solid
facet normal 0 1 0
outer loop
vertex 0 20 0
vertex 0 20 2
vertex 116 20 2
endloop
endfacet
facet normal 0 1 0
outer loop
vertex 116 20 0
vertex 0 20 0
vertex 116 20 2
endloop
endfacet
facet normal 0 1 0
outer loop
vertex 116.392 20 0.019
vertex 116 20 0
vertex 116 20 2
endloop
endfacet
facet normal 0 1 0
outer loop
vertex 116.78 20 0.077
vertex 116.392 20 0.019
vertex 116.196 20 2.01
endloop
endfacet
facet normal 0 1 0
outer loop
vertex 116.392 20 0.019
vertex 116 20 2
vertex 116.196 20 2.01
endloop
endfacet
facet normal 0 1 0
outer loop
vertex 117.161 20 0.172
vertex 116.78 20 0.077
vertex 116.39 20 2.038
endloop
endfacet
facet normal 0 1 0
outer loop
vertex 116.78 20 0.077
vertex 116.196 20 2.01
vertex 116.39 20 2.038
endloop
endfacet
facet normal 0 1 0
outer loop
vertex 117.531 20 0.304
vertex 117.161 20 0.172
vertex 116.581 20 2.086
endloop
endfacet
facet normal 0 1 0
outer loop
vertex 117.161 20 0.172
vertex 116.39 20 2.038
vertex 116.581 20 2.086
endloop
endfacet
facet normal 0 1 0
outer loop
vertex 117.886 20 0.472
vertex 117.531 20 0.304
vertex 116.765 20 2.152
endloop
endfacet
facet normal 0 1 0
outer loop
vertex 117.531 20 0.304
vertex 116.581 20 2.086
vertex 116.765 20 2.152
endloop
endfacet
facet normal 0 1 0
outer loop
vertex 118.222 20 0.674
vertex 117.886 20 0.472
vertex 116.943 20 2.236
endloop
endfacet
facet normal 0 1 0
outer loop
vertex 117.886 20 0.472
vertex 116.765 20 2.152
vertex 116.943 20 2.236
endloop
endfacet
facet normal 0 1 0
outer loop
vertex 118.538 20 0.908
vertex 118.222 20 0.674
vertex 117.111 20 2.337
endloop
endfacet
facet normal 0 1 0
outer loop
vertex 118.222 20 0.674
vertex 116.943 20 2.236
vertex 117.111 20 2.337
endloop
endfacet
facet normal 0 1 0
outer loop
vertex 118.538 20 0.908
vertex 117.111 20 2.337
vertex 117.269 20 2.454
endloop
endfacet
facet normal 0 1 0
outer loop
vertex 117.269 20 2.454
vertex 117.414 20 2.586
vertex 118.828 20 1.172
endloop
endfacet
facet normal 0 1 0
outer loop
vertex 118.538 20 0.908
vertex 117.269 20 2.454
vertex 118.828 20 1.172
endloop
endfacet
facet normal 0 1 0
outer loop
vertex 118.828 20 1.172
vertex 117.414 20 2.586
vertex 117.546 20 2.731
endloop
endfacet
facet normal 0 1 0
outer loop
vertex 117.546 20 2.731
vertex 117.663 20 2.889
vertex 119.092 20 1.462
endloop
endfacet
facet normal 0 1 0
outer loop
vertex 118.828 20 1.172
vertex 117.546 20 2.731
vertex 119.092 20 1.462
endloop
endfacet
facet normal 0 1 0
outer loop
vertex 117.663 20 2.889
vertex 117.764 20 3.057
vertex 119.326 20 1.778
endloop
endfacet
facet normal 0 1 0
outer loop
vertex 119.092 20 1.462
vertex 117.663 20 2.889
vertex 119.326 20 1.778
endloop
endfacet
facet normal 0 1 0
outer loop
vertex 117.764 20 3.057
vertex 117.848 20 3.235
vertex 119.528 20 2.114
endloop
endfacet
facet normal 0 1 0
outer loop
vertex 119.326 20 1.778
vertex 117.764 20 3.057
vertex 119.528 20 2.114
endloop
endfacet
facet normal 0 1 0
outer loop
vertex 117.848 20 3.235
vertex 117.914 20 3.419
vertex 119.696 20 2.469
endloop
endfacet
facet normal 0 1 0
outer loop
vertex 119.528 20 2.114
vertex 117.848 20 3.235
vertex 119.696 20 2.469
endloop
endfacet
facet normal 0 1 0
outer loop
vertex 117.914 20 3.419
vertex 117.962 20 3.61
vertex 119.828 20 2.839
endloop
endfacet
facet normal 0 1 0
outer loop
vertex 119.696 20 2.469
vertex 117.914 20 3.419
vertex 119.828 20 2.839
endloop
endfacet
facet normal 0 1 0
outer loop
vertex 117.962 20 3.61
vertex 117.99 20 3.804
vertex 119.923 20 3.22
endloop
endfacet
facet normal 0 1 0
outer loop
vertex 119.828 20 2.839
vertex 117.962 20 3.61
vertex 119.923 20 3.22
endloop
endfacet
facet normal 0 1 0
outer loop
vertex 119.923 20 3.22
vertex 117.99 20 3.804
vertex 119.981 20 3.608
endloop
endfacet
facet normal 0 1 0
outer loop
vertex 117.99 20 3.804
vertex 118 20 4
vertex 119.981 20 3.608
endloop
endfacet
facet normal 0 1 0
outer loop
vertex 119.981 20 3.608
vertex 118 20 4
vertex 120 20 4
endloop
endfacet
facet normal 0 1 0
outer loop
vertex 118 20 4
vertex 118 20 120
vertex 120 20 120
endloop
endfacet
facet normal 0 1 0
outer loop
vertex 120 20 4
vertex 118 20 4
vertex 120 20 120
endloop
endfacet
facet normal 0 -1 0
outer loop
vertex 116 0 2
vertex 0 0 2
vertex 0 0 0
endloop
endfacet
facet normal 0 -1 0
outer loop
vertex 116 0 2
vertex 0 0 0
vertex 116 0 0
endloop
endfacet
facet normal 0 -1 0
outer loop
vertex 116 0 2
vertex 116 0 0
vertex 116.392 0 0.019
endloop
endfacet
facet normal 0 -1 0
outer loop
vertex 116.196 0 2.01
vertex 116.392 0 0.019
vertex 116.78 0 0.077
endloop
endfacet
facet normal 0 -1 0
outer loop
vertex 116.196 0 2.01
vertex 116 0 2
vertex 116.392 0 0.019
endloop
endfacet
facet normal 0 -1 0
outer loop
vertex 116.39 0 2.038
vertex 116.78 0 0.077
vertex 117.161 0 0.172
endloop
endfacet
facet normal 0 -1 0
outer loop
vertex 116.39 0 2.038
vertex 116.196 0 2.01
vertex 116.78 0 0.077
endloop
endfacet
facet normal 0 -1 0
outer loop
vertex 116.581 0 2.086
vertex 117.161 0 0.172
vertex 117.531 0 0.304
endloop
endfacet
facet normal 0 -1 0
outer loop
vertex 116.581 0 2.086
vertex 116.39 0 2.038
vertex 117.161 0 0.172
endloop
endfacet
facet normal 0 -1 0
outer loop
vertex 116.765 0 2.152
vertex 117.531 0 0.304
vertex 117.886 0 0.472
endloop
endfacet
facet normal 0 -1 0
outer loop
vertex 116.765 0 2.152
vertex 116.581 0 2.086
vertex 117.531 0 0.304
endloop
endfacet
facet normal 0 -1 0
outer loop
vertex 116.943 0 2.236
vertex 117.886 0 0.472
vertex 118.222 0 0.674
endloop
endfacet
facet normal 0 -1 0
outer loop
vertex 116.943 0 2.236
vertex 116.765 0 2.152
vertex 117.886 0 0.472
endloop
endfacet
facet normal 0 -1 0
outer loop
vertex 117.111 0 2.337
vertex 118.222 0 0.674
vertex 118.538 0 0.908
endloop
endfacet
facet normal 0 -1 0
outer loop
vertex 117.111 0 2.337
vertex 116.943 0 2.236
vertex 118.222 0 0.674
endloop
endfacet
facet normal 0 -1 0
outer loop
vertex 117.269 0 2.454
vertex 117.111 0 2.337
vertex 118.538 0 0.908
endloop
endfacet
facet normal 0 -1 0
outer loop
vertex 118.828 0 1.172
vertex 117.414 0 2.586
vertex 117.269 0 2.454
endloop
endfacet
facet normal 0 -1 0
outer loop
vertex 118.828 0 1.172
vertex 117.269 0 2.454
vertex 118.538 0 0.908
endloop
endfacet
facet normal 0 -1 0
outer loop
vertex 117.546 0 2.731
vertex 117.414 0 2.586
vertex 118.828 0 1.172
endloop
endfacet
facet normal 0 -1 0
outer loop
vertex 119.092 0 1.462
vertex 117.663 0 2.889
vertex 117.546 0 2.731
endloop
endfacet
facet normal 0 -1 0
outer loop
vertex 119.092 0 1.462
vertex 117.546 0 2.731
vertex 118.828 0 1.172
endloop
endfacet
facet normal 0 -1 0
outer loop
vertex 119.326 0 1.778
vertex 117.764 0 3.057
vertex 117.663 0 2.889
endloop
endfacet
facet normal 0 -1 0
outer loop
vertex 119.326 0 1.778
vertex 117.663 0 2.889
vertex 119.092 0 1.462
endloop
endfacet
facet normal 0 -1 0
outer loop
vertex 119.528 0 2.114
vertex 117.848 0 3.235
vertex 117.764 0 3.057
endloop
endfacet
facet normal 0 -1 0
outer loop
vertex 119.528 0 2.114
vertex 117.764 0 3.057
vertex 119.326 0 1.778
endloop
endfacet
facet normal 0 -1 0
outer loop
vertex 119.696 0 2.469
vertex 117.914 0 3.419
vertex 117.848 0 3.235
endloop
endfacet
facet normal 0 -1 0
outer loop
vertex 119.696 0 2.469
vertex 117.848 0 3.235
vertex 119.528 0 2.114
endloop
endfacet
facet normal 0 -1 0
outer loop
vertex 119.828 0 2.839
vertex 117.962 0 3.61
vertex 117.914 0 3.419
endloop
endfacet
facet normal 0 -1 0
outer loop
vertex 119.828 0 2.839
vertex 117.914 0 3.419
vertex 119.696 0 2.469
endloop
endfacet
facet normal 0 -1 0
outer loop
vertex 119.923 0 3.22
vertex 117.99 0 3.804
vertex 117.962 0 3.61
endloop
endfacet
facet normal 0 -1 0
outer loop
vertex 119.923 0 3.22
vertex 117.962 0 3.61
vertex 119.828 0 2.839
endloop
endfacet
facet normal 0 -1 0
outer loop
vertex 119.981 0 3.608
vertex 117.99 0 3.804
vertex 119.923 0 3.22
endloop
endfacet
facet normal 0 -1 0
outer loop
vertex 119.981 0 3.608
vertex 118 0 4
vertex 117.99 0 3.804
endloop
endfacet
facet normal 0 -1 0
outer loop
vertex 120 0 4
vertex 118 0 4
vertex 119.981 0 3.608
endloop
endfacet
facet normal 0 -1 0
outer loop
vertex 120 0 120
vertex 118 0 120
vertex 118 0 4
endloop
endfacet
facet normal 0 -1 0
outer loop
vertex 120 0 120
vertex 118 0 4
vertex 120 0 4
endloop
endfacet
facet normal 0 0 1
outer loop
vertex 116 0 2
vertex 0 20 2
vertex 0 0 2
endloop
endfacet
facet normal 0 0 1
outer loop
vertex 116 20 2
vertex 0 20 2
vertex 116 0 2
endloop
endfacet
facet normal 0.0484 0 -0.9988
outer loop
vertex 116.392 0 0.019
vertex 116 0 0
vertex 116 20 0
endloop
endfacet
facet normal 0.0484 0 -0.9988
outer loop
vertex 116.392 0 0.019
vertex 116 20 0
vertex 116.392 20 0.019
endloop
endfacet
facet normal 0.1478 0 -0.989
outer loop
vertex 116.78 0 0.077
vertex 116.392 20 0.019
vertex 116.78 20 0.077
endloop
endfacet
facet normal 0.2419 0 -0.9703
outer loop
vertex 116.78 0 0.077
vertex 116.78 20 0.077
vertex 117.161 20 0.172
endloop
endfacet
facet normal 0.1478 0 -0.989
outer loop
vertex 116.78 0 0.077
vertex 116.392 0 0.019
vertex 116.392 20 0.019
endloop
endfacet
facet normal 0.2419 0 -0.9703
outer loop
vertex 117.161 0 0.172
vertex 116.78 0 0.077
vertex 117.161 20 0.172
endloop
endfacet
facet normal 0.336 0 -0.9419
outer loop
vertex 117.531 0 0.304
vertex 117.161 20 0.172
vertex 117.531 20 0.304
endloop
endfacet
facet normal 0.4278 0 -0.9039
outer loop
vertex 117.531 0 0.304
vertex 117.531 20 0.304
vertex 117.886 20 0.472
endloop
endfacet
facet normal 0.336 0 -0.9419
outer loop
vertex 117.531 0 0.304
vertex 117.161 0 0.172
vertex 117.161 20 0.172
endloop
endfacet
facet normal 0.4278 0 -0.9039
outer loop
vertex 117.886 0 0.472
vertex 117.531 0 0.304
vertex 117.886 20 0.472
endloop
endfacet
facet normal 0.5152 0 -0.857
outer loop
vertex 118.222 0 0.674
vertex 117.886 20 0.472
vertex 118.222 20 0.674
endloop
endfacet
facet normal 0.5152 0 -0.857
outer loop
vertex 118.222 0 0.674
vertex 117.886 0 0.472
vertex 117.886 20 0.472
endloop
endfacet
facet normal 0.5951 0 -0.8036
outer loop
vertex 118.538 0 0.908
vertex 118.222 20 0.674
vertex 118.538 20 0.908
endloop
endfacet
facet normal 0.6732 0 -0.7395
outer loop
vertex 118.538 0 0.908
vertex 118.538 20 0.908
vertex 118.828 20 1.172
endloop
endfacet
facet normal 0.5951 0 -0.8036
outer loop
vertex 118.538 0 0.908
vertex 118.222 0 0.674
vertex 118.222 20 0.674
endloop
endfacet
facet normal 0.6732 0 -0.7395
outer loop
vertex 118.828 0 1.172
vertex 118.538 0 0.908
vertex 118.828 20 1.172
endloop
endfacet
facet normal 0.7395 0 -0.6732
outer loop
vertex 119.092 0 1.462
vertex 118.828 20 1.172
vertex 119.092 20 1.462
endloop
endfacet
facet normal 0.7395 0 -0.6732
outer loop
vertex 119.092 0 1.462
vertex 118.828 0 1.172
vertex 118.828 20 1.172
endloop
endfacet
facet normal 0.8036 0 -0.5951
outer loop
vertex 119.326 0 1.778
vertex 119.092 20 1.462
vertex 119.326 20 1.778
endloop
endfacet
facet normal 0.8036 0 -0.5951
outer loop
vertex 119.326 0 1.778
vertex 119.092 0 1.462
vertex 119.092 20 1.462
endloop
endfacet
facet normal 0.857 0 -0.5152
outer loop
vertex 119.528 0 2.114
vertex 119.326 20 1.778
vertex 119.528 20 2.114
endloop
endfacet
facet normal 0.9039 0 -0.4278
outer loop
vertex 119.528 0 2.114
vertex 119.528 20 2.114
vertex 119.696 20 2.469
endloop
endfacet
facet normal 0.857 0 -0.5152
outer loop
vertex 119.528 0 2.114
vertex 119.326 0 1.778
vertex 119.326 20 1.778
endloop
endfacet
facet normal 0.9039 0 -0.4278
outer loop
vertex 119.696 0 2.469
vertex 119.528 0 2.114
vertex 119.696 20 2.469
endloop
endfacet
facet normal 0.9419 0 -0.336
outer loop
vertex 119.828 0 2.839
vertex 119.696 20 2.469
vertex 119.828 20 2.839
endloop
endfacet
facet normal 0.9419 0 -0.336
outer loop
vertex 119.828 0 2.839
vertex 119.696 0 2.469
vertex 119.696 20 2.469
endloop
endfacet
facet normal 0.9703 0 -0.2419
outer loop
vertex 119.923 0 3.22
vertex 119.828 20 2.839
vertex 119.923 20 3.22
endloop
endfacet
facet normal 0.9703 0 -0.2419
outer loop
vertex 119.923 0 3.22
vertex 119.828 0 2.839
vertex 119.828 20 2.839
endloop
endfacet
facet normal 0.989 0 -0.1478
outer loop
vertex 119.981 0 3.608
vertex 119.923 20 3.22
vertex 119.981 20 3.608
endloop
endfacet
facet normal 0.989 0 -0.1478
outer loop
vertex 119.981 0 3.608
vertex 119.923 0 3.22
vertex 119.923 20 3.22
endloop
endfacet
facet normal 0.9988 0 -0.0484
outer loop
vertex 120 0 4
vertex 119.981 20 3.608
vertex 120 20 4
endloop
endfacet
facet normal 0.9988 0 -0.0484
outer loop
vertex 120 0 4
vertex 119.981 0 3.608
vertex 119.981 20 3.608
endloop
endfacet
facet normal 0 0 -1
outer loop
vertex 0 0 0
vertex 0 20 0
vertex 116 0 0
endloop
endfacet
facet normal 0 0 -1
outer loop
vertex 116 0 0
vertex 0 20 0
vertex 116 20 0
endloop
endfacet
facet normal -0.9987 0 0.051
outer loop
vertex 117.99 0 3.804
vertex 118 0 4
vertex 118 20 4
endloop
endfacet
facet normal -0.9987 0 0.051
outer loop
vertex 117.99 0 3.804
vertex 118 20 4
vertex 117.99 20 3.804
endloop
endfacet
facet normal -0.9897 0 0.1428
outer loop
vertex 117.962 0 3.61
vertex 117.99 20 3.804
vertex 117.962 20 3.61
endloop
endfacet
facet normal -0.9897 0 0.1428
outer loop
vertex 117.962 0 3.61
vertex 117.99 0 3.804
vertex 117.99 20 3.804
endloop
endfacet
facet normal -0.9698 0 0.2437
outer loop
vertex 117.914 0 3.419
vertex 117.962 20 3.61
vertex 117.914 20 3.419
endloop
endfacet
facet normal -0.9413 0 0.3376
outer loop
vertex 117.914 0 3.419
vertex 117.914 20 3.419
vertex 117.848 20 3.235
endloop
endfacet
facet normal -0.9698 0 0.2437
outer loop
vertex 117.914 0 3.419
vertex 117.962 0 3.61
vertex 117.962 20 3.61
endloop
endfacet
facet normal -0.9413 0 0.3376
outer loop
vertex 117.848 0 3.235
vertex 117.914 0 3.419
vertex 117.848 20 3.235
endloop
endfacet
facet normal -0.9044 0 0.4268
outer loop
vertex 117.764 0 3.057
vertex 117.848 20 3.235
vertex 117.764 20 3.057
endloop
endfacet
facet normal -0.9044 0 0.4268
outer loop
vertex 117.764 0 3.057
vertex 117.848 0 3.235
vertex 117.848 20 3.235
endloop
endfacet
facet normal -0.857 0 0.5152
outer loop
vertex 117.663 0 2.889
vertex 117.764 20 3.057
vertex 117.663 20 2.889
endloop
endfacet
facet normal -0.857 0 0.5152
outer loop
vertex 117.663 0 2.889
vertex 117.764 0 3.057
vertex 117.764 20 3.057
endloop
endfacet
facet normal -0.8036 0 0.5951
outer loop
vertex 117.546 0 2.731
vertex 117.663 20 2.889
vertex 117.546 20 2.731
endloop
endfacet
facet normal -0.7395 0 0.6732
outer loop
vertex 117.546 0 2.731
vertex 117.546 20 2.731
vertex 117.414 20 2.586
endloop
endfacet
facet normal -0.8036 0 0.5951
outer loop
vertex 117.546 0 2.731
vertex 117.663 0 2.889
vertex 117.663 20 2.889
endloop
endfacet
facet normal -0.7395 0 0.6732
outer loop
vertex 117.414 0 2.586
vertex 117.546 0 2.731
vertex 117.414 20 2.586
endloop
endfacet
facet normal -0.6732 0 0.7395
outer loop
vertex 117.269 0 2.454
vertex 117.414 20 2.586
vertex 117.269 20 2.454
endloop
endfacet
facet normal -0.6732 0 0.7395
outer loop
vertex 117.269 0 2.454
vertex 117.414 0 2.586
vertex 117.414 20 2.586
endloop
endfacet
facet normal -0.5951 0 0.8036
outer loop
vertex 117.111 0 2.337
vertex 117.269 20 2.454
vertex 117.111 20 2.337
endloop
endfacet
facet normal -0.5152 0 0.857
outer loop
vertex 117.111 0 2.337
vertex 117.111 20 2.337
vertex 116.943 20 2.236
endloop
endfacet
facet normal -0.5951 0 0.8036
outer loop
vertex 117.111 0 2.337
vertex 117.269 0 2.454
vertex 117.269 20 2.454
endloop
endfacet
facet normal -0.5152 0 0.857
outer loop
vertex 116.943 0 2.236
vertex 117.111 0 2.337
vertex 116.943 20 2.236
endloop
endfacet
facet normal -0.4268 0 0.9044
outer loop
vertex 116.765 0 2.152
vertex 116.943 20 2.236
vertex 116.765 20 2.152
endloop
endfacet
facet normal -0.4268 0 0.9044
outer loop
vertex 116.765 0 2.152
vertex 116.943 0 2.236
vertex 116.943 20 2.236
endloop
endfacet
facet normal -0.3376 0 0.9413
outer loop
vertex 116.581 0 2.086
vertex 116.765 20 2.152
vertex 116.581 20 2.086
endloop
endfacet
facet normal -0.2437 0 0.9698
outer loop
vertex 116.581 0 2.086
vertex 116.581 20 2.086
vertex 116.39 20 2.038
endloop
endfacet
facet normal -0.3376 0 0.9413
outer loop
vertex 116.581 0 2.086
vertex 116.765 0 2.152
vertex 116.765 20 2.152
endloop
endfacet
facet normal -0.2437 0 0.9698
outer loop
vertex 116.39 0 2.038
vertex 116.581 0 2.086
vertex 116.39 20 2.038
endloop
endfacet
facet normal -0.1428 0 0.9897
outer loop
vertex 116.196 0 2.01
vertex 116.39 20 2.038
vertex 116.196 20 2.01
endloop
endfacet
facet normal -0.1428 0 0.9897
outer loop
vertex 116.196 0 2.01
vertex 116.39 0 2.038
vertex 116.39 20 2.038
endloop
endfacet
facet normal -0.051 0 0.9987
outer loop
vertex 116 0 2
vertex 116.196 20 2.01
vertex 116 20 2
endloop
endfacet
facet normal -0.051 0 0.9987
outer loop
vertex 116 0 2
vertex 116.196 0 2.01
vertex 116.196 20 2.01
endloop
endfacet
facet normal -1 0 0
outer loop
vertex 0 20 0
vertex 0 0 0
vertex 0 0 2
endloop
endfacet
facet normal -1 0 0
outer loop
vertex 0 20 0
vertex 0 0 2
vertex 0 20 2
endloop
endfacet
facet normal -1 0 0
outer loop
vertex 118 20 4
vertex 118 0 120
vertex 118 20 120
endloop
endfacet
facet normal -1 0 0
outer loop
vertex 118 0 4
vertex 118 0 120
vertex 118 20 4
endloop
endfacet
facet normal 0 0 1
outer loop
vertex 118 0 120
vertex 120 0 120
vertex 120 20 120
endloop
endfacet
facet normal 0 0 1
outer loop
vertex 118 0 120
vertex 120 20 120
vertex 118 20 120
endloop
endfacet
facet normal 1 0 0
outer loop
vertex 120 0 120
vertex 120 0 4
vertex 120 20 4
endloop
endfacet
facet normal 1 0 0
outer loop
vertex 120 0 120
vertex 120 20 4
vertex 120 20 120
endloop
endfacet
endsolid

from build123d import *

# Parameters (mm, degrees)
SKETCH_1_W                       = 120
SKETCH_1_H                       = 20
EXTRUDE_2_DEPTH                  = 2
SM_EDGE_FLANGE_2_STRIP_W         = 12
SM_EDGE_FLANGE_2_STRIP_H         = 2
SM_EDGE_FLANGE_2_STRIP_CUT_DEPTH = 20
SM_EDGE_FLANGE_2_DEPTH           = 20


# Sheet-metal steps are written as plain solids
with BuildPart() as part:
    # Эскиз1 → Бобышка-Вытянуть2 (new body)
    with BuildSketch(Plane.XY):
        with Locations((60, 10)):
            Rectangle(SKETCH_1_W, SKETCH_1_H)
    extrude(amount=EXTRUDE_2_DEPTH)

    # Ребро-кромка2 strip (across the edge) → Ребро-кромка2 strip cut (cut)
    with BuildSketch(Plane(origin=(120, 0, 2), x_dir=(-1, 0, 0), z_dir=(0, 1, 0))):
        with Locations((-2, -1)):
            Rectangle(SM_EDGE_FLANGE_2_STRIP_W, SM_EDGE_FLANGE_2_STRIP_H)
    extrude(amount=SM_EDGE_FLANGE_2_STRIP_CUT_DEPTH, mode=Mode.SUBTRACT)

    # Ребро-кромка2 section (across the edge) → Ребро-кромка2 (add)
    with BuildSketch(Plane(origin=(120, 0, 2), x_dir=(-1, 0, 0), z_dir=(0, 1, 0))):
        with BuildLine():
            Line((0, 2), (0, 118))
            Line((0, 118), (2, 118))
            Line((2, 118), (2, 2))
            ThreePointArc((2, 2), (2.585786438, 0.585786438), (4, 0))
            Line((4, 0), (4, -2))
            ThreePointArc((4, -2), (1.171572875, -0.828427125), (0, 2))
        make_face()
    extrude(amount=SM_EDGE_FLANGE_2_DEPTH)


solid = part.part
